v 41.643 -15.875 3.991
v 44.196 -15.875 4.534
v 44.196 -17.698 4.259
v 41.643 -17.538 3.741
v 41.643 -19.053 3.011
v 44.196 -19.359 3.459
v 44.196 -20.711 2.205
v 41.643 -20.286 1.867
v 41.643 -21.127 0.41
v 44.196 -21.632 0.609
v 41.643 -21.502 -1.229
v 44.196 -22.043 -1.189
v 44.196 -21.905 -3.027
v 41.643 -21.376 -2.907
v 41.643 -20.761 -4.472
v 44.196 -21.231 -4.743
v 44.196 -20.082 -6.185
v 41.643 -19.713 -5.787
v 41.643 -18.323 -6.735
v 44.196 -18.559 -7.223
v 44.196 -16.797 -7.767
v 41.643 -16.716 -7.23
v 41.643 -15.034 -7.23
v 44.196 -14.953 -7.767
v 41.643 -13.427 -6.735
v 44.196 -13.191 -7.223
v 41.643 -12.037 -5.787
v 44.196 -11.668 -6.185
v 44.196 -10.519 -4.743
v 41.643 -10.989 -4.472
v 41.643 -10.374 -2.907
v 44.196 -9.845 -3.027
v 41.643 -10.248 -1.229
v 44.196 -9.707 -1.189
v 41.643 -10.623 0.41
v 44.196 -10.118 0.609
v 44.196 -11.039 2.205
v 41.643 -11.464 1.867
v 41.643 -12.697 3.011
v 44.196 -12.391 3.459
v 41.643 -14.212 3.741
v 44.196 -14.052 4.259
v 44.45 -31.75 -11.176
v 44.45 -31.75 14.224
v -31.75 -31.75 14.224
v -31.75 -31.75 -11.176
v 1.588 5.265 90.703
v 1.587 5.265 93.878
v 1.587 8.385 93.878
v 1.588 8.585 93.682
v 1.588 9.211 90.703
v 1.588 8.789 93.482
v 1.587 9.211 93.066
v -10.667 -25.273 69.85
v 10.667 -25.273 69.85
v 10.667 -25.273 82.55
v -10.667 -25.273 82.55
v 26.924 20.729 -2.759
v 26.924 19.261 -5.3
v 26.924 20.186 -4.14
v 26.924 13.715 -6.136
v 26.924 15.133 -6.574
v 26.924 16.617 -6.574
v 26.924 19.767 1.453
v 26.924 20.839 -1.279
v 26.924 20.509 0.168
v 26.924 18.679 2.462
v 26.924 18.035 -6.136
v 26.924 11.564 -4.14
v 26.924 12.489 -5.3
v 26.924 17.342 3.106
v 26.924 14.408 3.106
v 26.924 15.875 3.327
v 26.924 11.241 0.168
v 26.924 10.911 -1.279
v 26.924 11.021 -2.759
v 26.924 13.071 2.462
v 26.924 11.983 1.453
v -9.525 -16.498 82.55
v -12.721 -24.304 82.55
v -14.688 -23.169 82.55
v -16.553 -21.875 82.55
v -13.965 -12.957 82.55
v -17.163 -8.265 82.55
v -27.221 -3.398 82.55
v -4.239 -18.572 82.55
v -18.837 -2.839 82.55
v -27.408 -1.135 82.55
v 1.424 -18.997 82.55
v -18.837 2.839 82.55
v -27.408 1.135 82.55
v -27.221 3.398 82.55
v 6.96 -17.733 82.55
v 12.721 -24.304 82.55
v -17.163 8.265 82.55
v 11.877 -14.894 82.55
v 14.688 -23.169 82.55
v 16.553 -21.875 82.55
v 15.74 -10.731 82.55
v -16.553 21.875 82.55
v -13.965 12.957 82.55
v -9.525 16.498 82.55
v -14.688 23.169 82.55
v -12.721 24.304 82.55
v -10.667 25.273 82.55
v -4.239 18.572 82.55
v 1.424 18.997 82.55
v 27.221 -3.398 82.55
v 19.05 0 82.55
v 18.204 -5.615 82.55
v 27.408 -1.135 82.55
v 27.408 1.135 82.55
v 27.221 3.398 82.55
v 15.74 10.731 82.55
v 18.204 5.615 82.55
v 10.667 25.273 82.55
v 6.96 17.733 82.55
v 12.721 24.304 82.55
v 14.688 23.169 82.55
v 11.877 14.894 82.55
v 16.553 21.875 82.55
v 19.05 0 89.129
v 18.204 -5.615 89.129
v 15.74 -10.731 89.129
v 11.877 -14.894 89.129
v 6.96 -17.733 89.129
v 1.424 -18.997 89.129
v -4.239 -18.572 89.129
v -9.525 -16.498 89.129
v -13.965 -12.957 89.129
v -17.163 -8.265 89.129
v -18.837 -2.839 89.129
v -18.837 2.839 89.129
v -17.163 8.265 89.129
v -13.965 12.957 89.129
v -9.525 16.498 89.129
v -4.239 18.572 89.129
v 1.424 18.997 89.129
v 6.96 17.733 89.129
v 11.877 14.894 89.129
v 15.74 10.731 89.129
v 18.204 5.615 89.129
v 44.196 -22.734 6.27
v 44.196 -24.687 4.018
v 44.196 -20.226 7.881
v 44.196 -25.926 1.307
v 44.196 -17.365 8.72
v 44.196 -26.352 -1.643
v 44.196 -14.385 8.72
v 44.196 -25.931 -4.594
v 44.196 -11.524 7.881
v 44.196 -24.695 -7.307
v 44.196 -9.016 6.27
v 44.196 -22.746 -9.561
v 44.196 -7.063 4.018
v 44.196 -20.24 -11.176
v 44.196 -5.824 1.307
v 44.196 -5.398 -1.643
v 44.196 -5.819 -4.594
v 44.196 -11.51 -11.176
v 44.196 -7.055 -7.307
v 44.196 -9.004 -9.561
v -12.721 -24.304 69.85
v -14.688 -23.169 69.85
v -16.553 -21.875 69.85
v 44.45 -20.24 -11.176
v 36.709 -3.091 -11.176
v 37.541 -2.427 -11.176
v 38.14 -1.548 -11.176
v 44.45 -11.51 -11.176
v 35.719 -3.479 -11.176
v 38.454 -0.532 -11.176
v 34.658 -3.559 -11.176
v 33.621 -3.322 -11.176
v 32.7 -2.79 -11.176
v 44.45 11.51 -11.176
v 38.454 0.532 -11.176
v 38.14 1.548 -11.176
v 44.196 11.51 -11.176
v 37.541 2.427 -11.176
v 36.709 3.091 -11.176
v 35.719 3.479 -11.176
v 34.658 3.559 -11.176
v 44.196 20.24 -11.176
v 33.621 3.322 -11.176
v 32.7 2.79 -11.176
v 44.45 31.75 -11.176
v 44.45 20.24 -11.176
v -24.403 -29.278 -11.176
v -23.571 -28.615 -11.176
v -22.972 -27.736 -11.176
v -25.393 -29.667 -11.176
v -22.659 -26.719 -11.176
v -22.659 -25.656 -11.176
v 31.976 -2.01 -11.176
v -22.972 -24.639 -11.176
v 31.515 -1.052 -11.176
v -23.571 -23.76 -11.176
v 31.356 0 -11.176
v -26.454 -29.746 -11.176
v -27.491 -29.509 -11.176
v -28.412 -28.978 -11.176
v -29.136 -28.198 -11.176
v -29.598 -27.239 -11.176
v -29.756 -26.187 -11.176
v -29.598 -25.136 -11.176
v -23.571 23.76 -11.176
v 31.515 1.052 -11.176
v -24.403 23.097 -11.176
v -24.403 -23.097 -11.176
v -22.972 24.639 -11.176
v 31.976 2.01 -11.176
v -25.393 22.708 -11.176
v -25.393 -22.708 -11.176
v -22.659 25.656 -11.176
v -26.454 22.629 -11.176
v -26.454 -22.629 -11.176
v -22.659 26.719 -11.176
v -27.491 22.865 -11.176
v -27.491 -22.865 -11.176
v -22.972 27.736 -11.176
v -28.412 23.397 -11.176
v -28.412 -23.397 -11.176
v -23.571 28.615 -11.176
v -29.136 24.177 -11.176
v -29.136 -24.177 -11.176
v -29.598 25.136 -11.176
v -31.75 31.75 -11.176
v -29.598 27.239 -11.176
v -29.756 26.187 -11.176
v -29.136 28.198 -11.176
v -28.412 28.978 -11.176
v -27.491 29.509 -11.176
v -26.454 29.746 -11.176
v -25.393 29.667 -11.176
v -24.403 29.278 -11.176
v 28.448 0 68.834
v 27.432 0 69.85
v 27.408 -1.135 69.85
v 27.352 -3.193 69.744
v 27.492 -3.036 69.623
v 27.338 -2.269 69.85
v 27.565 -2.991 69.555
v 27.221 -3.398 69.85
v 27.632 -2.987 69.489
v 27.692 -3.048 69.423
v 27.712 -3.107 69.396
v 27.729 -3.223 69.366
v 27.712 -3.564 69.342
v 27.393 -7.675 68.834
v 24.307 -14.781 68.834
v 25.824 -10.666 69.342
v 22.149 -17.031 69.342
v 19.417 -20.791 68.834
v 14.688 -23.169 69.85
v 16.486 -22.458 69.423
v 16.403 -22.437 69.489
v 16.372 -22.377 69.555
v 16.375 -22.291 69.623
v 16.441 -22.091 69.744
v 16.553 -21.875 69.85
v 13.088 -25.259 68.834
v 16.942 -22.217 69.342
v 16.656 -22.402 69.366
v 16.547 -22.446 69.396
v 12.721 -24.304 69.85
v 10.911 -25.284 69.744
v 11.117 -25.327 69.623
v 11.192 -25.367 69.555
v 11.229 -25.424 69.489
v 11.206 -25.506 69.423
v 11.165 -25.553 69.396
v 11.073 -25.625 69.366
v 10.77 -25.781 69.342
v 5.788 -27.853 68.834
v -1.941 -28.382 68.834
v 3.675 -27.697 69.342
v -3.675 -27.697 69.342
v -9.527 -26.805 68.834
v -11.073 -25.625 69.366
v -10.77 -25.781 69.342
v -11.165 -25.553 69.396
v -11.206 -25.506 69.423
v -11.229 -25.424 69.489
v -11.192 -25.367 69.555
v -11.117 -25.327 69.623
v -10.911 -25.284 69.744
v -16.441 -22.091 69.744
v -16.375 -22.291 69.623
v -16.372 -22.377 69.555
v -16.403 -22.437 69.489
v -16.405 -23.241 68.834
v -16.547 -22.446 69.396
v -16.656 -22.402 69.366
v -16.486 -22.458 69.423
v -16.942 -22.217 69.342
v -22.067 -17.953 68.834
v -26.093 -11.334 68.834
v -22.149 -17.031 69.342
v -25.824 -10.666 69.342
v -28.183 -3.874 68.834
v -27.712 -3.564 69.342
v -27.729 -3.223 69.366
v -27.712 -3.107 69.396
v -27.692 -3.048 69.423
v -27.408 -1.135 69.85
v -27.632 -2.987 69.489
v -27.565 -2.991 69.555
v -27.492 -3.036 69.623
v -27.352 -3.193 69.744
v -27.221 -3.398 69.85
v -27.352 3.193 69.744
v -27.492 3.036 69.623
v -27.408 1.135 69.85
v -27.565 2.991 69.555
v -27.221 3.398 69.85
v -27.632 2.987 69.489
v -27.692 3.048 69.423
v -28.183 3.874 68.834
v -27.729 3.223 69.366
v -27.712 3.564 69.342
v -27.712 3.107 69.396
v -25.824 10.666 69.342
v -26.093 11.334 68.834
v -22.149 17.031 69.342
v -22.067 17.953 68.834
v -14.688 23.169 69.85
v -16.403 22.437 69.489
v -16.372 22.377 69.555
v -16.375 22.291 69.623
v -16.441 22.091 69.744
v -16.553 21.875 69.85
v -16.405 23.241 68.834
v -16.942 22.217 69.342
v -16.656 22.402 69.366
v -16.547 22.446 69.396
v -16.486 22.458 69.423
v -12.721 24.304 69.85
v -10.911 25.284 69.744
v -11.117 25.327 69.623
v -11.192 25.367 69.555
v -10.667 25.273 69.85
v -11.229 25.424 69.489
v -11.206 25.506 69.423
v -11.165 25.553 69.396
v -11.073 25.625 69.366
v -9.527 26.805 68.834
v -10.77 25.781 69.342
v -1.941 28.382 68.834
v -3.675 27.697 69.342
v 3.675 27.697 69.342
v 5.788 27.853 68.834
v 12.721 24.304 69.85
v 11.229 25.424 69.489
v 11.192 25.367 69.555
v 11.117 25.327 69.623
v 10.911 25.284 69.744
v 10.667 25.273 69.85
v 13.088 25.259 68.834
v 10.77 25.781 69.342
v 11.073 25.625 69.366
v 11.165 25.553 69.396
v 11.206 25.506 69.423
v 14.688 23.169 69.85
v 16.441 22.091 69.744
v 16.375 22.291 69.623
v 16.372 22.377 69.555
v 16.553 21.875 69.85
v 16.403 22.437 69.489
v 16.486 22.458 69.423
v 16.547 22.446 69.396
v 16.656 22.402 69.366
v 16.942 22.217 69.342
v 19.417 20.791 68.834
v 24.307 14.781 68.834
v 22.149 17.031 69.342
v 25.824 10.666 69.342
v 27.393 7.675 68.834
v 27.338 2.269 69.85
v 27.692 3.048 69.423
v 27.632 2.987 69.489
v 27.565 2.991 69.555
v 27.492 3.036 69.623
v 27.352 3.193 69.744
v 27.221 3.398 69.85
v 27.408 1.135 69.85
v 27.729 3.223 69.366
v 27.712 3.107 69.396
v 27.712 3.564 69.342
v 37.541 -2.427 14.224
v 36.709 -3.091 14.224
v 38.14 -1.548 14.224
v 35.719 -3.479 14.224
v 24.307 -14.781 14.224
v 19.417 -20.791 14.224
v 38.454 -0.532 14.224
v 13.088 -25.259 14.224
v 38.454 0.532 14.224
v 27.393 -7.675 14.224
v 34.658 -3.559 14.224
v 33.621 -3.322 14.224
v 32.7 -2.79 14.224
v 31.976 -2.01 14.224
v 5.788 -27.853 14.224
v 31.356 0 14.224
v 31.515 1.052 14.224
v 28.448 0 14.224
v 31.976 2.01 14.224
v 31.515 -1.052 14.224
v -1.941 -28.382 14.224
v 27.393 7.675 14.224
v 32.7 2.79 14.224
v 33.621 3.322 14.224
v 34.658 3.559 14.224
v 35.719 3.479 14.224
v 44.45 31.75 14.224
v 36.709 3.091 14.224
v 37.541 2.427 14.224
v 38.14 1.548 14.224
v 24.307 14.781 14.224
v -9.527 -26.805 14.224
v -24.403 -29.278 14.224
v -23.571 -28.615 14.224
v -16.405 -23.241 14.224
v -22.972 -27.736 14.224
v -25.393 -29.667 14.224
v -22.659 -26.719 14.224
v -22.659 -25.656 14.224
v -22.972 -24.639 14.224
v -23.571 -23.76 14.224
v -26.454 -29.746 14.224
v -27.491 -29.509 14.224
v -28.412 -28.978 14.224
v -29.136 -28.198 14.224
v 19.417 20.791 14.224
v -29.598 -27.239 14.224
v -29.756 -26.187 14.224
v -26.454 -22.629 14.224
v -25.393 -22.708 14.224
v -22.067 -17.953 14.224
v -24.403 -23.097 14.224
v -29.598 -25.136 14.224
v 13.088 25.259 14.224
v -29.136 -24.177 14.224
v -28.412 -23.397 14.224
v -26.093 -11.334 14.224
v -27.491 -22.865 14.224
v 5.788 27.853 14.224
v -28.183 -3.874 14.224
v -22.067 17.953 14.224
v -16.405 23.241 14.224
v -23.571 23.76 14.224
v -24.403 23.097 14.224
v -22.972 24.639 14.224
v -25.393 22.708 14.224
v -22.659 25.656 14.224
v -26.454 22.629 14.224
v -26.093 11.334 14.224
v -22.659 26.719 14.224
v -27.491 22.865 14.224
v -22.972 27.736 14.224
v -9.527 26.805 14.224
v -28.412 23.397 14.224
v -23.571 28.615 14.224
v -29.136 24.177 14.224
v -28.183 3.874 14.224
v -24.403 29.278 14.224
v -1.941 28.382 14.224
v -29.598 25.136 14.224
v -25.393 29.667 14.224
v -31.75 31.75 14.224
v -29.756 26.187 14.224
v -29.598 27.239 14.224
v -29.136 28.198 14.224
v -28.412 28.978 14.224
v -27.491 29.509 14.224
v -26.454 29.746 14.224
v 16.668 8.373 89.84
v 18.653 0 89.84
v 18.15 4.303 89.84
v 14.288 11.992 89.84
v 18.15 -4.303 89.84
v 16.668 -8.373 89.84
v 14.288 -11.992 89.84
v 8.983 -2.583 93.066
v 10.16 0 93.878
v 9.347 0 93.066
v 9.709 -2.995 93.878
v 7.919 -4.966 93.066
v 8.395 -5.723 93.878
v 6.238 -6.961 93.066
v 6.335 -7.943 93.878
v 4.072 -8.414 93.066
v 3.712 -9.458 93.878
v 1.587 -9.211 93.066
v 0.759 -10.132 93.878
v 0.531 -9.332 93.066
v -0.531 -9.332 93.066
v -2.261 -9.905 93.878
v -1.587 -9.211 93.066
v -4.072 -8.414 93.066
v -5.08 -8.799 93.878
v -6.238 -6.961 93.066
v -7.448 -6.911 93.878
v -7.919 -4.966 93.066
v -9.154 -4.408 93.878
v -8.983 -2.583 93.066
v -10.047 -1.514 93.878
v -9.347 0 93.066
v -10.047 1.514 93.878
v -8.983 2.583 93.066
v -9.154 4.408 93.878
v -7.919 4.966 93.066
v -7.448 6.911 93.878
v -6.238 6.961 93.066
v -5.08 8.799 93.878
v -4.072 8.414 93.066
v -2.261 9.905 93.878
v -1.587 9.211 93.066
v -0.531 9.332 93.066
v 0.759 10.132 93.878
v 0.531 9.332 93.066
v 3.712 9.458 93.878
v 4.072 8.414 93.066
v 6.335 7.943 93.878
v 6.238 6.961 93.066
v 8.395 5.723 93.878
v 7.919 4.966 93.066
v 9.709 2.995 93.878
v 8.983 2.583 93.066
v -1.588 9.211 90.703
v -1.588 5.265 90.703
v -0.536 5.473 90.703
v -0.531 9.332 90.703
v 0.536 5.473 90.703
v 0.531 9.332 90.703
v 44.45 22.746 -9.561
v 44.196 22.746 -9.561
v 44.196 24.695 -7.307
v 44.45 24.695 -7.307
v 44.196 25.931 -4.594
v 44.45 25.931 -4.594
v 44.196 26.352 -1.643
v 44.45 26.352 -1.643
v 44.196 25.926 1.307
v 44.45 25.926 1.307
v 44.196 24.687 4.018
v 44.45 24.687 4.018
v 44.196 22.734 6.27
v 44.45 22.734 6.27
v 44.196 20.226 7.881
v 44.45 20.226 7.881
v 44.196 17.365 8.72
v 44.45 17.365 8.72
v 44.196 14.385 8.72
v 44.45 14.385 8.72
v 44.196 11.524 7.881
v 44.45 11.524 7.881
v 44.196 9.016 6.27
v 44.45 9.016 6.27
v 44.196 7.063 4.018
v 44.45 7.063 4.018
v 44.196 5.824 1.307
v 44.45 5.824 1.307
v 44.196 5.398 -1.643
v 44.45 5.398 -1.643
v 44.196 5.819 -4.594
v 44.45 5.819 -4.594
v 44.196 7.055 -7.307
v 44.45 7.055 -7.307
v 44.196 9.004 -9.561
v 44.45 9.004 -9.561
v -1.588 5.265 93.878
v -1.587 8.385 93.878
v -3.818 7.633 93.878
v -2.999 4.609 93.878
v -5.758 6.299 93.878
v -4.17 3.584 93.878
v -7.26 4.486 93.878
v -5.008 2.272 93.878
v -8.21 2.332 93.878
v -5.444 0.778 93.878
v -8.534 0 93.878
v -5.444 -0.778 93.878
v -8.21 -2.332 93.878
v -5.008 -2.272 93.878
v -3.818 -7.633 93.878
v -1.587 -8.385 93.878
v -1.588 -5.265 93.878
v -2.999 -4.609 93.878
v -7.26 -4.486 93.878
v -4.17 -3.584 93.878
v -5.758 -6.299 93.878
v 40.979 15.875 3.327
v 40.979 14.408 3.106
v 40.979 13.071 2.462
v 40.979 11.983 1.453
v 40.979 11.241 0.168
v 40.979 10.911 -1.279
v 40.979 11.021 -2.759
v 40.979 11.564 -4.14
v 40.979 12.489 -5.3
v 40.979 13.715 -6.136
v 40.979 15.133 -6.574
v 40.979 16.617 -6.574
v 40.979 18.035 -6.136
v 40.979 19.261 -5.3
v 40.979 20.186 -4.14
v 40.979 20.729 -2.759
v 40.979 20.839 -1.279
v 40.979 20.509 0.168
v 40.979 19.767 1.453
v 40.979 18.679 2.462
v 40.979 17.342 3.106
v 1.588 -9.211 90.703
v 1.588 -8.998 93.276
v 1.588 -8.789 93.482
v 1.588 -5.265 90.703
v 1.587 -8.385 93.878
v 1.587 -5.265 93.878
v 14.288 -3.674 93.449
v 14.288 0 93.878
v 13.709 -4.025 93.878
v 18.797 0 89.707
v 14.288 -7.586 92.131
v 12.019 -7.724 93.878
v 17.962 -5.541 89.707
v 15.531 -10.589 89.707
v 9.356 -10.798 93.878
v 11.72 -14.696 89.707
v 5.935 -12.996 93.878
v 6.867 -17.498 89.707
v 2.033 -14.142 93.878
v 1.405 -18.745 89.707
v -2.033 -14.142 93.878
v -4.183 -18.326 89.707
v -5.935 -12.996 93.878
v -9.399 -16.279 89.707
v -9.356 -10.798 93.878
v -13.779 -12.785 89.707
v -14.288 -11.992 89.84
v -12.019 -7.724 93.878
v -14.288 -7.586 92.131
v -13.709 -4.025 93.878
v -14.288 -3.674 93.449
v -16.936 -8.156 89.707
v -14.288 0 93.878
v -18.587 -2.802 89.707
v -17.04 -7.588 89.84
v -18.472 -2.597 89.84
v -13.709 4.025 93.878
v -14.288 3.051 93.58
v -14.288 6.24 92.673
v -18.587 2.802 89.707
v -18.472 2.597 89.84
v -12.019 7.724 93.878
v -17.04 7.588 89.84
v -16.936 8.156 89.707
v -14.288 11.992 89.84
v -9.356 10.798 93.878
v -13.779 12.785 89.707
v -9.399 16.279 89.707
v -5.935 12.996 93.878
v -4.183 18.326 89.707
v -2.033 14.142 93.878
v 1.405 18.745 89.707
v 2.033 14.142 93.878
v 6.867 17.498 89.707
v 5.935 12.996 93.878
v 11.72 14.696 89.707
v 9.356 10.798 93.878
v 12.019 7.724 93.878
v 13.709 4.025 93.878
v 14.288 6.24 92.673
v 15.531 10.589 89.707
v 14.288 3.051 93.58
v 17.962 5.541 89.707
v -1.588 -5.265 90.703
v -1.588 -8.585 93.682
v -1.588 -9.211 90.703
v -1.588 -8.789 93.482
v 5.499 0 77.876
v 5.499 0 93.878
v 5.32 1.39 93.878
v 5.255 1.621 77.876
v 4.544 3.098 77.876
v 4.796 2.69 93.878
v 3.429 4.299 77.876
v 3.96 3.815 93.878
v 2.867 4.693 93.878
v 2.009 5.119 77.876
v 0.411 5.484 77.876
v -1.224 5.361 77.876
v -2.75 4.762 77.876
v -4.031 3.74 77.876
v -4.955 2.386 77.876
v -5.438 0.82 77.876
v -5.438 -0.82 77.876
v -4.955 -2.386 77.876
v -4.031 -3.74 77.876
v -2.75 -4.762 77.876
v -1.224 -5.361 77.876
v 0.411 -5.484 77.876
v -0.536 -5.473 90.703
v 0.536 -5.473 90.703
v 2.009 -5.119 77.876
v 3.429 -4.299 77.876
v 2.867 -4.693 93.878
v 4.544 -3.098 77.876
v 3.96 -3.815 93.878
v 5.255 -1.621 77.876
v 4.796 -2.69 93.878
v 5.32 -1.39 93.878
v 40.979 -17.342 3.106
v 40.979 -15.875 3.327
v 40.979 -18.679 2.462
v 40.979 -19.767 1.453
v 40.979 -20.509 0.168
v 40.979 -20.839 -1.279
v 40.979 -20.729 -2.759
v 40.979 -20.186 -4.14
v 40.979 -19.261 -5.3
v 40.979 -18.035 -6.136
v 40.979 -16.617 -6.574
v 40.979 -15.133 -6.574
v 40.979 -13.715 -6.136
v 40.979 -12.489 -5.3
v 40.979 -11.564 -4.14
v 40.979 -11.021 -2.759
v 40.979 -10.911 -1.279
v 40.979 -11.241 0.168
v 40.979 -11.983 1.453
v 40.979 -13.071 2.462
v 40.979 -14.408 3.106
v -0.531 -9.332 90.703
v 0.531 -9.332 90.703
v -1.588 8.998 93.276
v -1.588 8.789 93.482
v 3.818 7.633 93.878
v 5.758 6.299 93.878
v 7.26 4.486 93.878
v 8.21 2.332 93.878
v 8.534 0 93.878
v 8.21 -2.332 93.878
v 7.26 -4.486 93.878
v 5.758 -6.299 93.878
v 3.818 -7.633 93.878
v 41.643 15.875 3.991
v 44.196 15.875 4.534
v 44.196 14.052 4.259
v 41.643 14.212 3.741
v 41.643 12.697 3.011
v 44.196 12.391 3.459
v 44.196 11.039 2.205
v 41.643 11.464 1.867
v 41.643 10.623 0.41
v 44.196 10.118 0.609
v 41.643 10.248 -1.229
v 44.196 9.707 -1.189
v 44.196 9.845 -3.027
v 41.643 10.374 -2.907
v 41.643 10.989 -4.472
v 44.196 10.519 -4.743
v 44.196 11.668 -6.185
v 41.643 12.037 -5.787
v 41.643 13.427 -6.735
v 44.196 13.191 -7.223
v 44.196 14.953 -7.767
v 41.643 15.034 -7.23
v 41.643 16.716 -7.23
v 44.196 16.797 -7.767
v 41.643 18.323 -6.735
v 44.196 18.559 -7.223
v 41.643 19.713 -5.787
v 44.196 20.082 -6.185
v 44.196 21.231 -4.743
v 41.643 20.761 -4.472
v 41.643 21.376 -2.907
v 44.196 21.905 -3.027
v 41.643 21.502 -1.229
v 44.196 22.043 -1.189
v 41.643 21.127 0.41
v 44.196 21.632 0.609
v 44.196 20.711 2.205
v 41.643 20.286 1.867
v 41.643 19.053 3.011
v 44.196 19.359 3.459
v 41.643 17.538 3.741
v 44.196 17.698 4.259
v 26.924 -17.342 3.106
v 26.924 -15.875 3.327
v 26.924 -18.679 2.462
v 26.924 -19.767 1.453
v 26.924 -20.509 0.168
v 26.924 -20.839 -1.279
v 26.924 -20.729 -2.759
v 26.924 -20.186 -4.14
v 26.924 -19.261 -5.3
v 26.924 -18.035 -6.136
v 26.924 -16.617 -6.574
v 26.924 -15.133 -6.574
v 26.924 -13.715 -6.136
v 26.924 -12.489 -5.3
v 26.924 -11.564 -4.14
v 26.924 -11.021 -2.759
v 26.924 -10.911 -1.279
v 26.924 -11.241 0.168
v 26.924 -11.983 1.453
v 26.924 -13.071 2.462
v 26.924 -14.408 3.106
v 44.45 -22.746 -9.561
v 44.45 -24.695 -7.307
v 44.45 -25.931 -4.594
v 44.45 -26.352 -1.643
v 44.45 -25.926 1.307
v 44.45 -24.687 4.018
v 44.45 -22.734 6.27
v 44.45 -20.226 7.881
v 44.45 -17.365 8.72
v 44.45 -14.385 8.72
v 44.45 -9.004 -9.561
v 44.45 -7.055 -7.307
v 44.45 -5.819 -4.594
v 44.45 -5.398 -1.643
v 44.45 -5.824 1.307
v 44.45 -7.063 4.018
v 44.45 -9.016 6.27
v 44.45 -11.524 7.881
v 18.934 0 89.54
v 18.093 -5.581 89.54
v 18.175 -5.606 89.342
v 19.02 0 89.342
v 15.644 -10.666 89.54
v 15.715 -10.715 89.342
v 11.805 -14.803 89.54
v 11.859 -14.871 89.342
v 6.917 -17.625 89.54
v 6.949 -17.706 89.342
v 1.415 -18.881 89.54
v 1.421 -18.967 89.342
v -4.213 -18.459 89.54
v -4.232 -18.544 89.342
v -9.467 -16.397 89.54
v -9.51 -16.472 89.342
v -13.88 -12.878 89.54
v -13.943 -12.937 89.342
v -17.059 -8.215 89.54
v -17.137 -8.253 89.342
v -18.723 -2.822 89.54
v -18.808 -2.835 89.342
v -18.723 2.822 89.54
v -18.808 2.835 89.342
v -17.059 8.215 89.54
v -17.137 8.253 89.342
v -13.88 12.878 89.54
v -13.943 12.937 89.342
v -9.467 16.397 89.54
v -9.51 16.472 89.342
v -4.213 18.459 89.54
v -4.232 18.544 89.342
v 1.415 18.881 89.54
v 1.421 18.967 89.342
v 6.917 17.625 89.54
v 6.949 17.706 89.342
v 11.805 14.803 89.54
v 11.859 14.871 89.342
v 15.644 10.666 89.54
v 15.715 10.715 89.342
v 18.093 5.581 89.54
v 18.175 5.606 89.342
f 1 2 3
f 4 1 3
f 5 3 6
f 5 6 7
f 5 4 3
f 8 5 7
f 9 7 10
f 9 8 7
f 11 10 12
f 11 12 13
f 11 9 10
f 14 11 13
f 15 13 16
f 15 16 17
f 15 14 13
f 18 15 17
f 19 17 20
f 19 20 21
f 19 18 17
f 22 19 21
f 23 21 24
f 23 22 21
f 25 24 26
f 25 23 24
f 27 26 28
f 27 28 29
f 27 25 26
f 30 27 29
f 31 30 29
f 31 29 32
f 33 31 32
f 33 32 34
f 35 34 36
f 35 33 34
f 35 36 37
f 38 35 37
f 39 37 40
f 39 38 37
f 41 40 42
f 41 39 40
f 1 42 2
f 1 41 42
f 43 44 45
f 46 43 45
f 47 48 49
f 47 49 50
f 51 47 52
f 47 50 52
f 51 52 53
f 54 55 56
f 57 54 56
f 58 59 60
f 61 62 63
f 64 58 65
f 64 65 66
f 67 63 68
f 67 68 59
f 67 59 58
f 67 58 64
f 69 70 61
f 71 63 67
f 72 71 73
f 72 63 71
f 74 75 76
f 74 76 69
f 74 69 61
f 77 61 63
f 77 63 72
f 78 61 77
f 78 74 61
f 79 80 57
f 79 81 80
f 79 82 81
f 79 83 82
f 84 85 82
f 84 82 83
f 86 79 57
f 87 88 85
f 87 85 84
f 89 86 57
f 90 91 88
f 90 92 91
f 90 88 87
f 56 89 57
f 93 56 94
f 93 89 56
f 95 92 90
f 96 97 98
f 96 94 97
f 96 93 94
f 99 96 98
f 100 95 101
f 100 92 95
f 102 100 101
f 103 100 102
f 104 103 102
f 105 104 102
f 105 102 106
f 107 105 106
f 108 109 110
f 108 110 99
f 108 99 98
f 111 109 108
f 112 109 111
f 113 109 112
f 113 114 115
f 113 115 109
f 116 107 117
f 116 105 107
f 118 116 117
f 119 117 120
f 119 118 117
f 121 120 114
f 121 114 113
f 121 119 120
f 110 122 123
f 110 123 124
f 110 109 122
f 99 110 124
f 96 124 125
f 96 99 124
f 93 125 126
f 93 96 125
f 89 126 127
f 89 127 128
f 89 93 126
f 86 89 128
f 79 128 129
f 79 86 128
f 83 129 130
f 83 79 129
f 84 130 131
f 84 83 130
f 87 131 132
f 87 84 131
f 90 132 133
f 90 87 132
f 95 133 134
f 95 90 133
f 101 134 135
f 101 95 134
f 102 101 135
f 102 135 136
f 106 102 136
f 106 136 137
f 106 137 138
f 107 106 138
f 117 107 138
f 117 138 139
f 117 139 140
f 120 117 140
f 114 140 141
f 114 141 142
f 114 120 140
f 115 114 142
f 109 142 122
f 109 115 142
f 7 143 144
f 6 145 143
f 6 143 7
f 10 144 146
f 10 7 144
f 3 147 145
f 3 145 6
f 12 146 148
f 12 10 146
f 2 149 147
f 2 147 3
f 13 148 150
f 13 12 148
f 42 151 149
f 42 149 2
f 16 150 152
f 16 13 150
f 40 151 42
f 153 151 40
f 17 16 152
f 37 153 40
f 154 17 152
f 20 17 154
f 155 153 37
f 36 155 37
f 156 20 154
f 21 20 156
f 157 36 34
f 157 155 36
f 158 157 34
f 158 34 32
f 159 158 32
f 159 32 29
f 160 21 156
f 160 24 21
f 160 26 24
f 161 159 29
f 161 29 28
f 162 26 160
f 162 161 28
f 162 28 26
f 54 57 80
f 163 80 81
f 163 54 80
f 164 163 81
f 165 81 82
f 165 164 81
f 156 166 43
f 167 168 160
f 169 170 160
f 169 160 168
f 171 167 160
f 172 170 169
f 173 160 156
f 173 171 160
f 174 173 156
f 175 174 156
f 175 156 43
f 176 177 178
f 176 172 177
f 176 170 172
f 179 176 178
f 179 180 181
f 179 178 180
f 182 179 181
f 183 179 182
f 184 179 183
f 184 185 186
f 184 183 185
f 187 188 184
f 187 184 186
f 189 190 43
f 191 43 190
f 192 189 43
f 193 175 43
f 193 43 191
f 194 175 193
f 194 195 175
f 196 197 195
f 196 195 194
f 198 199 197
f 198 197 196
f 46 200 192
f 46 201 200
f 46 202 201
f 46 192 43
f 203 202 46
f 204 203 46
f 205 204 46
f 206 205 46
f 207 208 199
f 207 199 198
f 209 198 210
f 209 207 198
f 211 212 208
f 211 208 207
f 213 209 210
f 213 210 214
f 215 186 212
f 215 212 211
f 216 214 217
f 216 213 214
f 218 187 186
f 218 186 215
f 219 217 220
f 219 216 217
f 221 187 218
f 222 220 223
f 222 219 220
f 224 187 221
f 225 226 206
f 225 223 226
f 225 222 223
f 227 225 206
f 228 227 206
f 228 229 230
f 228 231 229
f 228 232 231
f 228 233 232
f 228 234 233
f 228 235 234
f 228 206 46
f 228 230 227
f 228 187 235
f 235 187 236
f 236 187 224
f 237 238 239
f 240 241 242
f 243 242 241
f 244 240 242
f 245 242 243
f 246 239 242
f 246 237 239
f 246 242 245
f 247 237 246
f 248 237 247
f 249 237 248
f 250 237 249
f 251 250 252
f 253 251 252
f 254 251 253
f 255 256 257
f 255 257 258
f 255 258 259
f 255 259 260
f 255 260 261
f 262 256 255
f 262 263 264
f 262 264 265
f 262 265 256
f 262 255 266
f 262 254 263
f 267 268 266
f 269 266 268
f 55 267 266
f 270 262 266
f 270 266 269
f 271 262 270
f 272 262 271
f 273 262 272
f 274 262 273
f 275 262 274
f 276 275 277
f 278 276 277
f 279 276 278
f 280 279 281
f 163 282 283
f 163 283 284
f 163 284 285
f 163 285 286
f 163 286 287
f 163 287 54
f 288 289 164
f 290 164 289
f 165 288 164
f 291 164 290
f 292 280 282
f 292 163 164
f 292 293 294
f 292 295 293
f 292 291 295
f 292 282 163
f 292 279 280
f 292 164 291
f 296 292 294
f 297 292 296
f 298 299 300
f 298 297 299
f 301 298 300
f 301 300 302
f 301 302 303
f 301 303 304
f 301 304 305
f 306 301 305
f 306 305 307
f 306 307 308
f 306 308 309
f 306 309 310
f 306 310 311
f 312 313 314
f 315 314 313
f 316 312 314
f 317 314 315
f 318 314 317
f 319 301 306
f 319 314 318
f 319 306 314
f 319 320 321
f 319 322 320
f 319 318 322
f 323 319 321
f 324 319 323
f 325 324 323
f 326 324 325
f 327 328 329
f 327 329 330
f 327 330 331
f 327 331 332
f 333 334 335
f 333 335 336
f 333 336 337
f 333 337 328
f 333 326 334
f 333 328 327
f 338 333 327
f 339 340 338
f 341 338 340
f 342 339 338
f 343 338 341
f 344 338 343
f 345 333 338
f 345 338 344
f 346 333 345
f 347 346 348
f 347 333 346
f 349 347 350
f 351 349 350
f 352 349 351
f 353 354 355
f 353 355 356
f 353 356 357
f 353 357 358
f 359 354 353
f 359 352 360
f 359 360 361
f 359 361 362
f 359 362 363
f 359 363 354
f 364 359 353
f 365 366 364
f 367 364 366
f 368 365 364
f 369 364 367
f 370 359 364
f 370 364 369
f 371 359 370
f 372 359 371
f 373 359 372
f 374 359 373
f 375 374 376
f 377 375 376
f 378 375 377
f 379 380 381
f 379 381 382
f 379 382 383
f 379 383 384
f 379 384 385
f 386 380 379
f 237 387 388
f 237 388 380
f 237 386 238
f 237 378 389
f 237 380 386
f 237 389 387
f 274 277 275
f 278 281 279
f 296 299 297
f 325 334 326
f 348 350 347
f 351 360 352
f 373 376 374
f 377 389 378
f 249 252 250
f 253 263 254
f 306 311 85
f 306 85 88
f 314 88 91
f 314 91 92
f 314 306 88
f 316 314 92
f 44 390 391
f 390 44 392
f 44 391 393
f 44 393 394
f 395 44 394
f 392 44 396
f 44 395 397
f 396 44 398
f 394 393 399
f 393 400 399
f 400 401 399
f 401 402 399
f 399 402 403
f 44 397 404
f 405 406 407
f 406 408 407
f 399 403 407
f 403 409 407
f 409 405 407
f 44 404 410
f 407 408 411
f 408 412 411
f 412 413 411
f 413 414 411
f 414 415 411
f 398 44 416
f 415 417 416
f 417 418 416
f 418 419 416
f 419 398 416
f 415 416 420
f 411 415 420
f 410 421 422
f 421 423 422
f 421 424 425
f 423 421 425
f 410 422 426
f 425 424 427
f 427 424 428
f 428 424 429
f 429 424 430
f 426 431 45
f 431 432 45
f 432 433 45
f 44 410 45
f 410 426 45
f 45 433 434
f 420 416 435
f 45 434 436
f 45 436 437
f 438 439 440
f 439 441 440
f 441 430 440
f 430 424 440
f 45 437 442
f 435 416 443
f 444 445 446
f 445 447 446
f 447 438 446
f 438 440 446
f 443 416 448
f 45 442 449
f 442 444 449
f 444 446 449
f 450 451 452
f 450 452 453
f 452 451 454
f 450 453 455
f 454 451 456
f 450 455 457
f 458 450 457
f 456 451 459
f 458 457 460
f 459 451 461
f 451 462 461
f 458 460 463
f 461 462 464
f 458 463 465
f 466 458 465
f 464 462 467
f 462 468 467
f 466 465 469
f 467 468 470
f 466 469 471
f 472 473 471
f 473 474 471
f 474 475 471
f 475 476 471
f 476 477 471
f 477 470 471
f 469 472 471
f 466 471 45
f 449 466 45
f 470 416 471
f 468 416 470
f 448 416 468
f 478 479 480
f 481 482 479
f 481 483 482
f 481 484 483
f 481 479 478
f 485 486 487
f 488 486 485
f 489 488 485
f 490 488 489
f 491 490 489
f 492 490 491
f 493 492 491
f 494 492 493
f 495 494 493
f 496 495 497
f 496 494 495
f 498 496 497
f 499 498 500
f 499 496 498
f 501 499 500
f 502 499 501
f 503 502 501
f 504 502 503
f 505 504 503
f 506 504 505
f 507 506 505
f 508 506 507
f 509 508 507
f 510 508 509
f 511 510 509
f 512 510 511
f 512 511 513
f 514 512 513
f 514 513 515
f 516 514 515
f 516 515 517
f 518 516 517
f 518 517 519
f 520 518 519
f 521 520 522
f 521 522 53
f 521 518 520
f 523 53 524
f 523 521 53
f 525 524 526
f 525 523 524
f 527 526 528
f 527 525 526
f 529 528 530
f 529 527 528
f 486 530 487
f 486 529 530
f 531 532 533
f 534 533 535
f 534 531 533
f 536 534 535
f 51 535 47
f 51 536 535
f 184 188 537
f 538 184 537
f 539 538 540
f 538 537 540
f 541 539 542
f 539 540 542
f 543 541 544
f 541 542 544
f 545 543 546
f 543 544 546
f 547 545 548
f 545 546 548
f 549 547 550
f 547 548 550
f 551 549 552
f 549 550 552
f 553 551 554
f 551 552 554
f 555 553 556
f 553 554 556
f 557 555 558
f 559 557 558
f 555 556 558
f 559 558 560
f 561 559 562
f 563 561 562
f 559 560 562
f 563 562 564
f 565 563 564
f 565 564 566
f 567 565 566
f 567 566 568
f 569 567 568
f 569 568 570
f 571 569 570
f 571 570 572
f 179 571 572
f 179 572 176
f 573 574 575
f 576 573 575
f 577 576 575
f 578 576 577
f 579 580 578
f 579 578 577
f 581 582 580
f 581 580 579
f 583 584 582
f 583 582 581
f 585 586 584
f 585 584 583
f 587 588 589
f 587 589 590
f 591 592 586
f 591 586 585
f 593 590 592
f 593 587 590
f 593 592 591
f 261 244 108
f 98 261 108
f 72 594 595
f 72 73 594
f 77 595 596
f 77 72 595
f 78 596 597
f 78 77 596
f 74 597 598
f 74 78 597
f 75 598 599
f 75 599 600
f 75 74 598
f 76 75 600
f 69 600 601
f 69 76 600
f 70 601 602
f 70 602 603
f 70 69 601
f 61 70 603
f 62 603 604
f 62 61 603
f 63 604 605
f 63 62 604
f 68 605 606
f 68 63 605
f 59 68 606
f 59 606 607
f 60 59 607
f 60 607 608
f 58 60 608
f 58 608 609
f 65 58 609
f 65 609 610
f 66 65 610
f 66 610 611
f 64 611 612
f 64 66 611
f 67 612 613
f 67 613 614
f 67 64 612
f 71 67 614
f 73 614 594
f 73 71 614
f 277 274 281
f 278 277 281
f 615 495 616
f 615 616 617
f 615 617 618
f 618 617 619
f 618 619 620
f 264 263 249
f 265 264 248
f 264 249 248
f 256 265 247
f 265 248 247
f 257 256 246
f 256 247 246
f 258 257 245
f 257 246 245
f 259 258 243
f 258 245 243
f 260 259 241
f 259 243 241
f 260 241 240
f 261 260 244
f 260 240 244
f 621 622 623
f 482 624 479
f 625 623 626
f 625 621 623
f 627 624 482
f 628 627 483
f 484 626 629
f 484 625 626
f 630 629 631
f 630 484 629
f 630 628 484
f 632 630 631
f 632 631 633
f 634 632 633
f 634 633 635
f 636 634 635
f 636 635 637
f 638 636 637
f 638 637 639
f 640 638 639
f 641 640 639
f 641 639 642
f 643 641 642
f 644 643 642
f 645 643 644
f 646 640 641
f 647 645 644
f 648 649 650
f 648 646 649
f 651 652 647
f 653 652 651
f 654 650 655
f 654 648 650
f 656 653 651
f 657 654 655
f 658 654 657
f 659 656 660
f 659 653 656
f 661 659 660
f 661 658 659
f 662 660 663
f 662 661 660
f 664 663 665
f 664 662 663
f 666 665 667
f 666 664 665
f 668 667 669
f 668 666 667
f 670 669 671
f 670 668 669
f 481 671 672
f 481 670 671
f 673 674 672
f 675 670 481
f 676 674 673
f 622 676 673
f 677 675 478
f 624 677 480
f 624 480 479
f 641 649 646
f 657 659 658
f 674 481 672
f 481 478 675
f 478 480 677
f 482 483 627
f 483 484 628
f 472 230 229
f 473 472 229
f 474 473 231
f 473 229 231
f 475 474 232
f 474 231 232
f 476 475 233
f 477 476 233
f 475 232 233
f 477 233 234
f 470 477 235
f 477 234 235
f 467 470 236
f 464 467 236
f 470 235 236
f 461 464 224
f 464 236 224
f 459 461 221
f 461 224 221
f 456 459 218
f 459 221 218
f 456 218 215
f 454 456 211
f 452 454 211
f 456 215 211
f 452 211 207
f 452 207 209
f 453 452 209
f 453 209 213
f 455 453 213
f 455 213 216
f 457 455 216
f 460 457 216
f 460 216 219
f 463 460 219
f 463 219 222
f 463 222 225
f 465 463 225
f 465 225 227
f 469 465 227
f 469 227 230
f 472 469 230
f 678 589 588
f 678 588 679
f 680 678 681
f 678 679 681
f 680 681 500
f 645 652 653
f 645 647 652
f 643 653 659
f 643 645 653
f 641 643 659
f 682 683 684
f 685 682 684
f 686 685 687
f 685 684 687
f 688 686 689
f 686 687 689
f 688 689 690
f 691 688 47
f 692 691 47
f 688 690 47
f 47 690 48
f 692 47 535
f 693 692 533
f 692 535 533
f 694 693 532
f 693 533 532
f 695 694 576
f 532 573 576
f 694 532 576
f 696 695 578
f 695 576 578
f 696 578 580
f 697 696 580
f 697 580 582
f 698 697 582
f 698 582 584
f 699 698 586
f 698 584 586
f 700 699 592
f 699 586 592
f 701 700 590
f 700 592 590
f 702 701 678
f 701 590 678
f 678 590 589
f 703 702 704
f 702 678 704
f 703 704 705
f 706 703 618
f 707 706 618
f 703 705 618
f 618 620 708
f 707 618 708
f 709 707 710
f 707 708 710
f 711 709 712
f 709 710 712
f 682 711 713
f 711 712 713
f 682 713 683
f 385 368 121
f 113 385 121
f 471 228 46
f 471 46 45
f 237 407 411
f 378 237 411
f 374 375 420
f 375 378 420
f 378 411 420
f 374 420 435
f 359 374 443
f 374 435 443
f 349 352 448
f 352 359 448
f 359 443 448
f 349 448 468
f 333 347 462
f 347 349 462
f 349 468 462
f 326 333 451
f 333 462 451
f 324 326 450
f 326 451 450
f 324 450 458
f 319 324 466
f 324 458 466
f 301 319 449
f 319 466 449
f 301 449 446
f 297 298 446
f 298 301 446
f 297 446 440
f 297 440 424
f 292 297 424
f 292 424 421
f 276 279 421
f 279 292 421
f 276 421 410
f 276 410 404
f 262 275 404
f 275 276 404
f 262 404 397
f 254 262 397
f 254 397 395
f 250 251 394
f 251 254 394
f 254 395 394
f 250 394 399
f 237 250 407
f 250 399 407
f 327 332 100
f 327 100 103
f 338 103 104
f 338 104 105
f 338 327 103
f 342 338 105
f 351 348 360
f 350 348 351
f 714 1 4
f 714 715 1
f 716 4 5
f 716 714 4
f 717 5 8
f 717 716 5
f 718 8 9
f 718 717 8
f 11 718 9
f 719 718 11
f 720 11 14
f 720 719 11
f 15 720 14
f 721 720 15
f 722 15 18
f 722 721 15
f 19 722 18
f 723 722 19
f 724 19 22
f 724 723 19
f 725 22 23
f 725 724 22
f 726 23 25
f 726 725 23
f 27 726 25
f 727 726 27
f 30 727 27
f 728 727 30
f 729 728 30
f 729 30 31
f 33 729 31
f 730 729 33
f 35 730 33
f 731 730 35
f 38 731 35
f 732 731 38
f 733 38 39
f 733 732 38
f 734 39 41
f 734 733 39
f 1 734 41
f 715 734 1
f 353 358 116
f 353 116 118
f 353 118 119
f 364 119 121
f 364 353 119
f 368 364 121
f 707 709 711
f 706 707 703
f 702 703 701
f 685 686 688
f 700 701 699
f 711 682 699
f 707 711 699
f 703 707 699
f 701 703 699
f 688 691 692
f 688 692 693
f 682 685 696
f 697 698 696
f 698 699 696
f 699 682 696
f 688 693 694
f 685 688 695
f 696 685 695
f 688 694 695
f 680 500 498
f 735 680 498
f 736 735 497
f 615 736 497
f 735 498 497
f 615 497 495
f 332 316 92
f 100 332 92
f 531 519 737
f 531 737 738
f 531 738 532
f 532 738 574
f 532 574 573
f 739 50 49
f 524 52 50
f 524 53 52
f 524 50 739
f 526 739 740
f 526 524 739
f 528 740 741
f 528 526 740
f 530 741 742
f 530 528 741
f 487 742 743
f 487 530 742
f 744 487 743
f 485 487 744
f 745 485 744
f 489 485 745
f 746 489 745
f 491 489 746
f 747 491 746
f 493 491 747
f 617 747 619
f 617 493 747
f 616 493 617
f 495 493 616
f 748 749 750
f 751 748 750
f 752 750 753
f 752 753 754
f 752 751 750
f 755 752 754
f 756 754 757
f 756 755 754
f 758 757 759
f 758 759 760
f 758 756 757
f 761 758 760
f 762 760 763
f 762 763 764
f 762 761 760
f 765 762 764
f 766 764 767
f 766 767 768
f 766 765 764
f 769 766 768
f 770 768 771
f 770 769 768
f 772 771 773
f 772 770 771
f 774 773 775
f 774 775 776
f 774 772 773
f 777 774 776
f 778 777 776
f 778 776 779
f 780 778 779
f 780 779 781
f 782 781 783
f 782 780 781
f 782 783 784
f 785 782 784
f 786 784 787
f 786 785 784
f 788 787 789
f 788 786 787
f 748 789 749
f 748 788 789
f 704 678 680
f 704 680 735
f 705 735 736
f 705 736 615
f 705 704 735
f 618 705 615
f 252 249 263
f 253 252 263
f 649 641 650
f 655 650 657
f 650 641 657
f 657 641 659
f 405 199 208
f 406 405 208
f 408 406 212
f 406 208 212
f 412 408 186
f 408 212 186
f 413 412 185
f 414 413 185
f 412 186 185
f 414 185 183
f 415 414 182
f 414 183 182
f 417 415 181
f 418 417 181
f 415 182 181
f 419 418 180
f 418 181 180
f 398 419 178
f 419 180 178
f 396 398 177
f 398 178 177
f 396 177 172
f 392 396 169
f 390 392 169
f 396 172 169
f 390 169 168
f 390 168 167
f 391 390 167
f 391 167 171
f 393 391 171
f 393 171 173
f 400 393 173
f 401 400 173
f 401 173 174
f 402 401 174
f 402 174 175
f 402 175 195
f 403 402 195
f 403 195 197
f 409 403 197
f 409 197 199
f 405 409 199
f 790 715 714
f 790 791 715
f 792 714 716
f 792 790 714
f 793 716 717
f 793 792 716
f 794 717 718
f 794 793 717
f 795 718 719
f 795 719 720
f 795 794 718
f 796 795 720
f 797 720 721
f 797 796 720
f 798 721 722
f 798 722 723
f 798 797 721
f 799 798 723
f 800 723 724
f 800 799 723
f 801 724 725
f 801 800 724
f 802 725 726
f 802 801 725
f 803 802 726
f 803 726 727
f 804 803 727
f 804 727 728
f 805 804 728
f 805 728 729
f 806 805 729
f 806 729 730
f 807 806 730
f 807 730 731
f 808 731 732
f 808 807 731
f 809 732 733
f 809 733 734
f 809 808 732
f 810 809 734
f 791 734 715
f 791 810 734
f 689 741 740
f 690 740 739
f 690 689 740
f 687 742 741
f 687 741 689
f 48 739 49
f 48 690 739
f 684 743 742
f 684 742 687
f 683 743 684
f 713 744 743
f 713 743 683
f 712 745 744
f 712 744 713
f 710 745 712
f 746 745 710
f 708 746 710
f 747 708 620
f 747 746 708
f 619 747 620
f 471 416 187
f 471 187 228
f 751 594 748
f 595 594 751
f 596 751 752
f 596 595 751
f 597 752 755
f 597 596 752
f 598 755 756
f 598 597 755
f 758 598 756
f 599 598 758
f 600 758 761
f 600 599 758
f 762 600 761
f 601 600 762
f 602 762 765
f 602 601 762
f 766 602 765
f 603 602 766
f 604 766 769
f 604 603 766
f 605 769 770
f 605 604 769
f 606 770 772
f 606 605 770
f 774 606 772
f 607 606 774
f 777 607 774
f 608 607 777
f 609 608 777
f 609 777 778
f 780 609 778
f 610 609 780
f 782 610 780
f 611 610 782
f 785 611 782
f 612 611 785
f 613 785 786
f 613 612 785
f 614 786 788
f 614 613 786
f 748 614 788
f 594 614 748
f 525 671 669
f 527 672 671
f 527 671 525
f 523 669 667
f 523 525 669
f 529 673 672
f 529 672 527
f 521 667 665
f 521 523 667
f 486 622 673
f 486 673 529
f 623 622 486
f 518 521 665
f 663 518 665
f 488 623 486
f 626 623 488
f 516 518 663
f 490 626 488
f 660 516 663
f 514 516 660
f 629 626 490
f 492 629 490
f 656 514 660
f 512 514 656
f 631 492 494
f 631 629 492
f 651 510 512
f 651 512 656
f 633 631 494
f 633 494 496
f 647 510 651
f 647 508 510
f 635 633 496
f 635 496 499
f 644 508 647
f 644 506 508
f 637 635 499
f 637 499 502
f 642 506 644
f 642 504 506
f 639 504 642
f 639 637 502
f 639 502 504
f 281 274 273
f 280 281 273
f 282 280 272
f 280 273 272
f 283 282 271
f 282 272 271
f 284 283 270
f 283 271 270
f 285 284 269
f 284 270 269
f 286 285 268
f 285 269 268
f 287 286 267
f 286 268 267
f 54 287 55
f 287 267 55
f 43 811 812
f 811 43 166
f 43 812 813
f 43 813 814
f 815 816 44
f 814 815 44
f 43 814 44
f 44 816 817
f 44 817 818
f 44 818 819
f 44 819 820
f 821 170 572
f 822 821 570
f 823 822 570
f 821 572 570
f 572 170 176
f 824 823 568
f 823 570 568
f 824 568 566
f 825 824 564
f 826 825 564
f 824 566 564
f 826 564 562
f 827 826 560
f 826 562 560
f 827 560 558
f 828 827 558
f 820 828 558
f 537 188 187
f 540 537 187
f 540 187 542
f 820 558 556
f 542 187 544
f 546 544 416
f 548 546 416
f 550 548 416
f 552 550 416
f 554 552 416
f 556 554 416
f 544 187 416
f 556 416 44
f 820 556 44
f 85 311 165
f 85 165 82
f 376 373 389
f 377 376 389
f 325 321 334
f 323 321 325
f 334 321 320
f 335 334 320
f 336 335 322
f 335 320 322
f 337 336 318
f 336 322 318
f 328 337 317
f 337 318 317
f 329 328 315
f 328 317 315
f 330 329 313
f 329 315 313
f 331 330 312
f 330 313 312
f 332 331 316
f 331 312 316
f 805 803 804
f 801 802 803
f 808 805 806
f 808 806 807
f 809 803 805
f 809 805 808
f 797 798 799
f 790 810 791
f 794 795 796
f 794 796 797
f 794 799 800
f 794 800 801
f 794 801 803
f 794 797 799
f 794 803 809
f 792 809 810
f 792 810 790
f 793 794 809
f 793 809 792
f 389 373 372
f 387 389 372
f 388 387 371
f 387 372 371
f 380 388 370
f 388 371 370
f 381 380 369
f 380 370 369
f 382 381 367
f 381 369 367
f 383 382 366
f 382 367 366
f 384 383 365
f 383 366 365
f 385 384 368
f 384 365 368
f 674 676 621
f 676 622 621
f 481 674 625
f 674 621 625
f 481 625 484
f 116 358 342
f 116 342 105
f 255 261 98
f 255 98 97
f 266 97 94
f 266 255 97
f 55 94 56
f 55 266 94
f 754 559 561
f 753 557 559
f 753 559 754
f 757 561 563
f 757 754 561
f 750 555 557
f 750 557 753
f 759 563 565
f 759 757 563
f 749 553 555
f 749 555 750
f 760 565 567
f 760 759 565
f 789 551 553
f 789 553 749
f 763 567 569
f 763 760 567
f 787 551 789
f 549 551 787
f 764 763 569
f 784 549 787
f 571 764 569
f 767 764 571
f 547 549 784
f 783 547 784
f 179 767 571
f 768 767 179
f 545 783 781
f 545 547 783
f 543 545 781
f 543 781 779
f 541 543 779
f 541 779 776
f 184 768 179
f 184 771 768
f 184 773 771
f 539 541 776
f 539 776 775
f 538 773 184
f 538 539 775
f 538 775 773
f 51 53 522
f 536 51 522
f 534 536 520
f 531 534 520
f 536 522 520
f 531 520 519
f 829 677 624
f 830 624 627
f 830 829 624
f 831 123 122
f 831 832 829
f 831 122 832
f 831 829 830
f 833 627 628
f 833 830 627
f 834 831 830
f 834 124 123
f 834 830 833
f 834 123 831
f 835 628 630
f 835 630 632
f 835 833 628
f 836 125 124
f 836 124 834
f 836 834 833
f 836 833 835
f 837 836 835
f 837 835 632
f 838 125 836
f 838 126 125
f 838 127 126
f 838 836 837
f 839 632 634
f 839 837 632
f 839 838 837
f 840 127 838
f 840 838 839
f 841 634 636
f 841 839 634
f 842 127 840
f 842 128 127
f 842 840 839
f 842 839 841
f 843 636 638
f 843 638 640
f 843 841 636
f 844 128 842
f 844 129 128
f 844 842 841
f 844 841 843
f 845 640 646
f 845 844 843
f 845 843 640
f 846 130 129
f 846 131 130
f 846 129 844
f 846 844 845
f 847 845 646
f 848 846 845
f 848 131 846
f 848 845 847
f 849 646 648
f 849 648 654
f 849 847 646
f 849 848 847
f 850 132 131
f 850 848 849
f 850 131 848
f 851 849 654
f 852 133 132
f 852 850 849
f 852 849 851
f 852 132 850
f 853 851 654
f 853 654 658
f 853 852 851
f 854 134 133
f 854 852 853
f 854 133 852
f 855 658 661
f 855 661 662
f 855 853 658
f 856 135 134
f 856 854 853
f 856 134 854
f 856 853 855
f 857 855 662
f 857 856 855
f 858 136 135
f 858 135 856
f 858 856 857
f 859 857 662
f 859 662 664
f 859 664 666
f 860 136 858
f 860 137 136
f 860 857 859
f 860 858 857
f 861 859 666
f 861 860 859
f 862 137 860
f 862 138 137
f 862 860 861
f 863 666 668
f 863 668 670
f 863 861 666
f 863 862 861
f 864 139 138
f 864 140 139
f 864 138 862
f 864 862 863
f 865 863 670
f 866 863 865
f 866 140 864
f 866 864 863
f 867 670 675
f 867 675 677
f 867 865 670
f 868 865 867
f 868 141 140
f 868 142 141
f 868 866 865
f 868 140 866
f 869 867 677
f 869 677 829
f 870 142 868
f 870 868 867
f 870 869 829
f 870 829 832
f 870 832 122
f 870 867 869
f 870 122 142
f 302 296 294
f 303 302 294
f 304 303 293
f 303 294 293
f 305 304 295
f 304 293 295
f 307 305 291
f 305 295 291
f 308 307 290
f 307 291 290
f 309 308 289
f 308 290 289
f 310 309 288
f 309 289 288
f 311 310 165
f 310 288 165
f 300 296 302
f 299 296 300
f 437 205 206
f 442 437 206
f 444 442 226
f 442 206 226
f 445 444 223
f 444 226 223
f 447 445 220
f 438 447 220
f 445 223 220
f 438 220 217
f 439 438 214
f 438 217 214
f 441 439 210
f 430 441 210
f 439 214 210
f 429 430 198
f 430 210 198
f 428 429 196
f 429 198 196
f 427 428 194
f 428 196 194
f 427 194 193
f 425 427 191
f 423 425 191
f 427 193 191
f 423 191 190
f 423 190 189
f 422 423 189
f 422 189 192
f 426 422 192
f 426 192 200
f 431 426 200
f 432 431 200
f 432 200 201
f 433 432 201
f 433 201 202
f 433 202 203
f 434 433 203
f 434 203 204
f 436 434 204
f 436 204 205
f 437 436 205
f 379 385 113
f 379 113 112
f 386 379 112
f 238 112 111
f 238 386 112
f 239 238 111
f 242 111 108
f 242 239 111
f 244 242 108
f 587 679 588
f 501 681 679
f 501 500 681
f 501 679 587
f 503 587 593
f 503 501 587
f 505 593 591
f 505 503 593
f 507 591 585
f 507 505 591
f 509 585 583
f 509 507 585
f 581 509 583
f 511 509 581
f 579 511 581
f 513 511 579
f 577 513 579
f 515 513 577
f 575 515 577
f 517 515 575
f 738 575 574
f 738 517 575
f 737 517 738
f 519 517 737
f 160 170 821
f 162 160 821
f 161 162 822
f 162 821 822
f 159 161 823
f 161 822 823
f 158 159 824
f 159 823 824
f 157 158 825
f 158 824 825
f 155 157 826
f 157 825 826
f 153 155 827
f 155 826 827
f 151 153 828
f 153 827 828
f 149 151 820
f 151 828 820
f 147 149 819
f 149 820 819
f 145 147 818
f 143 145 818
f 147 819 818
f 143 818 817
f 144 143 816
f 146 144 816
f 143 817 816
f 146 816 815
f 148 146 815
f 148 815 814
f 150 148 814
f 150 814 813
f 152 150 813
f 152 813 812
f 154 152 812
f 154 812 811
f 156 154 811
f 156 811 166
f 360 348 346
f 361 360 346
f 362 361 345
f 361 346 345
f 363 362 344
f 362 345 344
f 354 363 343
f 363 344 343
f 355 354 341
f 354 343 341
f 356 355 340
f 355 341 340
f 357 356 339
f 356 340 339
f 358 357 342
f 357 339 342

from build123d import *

# Parameters (mm, degrees)
SKETCH1_R           = 28.448
EXTRUDE1_DEPTH      = 82.55
CUT_EXTRUDE1_DEPTH  = 34.1376
SKETCH13_W          = 11.3284
SKETCH13_H          = 19.05
S2D0011_W           = 5.4991
S2D0011_H           = 16.002
SKETCH16_W          = 76.2
SKETCH16_H          = 25.4
EXTRUDE2_DEPTH      = 31.75
EXTRUDE2_DEPTH_BACK = 31.75
SKETCH17_R          = 10.4775
CUT_EXTRUDE9_DEPTH  = 0.254
SKETCH18_R          = 10.4775
CUT_EXTRUDE10_DEPTH = 0.254
CIRPATTERN2_COUNT   = 6
HOLE1_D             = 7.1374
HOLE1_DEPTH         = 25.4
CUT_EXTRUDE11_DEPTH = 4.0386
CUT_EXTRUDE12_DEPTH = 3.175


with BuildPart() as part:
    # Sketch1 → Extrude1 (new body)
    with BuildSketch(Plane.XY):
        Circle(SKETCH1_R)
    extrude(amount=EXTRUDE1_DEPTH)

    # Sketch2 → Cut-Extrude1 (cut, symmetric)
    with BuildSketch(Plane(origin=(0, 0, 0), x_dir=(0, 0, 1), z_dir=(1, 0, 0))):
        with BuildLine():
            Line((69.342, 28.448), (69.342, 25.781))
            ThreePointArc((69.342, 25.781), (69.490789755, 25.421789755), (69.85, 25.273))
            Line((69.85, 25.273), (82.55, 25.273))
            Line((82.55, 25.273), (82.55, 28.448))
            Line((82.55, 28.448), (69.342, 28.448))
        make_face()
    cut_extrude1 = extrude(amount=CUT_EXTRUDE1_DEPTH, both=True, mode=Mode.SUBTRACT)

    # Sketch10 → Cut-Revolve1 (revolve, cut)
    with BuildSketch(Plane(origin=(0, 0, 0), x_dir=(0, 0, -1), z_dir=(1, 0, 0)), mode=Mode.PRIVATE) as cut_revolve1_sk:
        Polygon((-82.55, 27.432), (-69.85, 27.432), (-68.834, 28.448), (-82.55, 28.448), align=None)
    revolve(cut_revolve1_sk.sketch.rotate(Axis((0, 0, 83.2358), (0, 0, -1)), 90), axis=Axis((0, 0, 83.2358), (0, 0, -1)), mode=Mode.SUBTRACT)  # turned: the seam where the file's is

    # Sketch13 → Revolve1 (revolve)
    with BuildSketch(Plane(origin=(0, 0, 0), x_dir=(0, 0, -1), z_dir=(1, 0, 0)), mode=Mode.PRIVATE) as revolve1_sk:
        with Locations((-88.2142, 9.525)):
            Rectangle(SKETCH13_W, SKETCH13_H)
    revolve(revolve1_sk.sketch.rotate(Axis((0, 0, 94.44482), (0, 0, -1)), 90), axis=Axis((0, 0, 94.44482), (0, 0, -1)))  # turned: the seam where the file's is

    # S2D0011 → Cut-Revolve4 (revolve, cut)
    with BuildSketch(Plane(origin=(-5.4991, 0, 93.8784), x_dir=(-1, 0, 0), z_dir=(0, 1, 0)), mode=Mode.PRIVATE) as cut_revolve4_sk:
        with Locations((-2.74955, -8.001)):
            Rectangle(S2D0011_W, S2D0011_H)
    revolve(cut_revolve4_sk.sketch.rotate(Axis((0, 0, 39.576937479), (0, 0, 1)), 180), axis=Axis((0, 0, 39.576937479), (0, 0, 1)), mode=Mode.SUBTRACT)  # turned: the seam where the file's is

    # Sketch15 → Cut-Revolve5 (revolve, cut)
    with BuildSketch(Plane(origin=(0, 0, 0), x_dir=(0, 0, -1), z_dir=(1, 0, 0)), mode=Mode.PRIVATE) as cut_revolve5_sk:
        with BuildLine():
            Line((-93.8784, 14.2875), (-89.706615474, 18.79729325))
            ThreePointArc((-89.706615474, 18.79729325), (-89.444021381, 18.984062482), (-89.1286, 19.05))
            Line((-89.1286, 19.05), (-93.8784, 19.05))
            Line((-93.8784, 19.05), (-93.8784, 14.2875))
        make_face()
    revolve(cut_revolve5_sk.sketch.rotate(Axis((0, 0, 94.11589), (0, 0, -1)), 90), axis=Axis((0, 0, 94.11589), (0, 0, -1)), mode=Mode.SUBTRACT)  # turned: the seam where the file's is

    # Sketch16 → Extrude2 (add, two sides)
    with BuildSketch(Plane(origin=(0, 0, 0), x_dir=(-1, 0, 0), z_dir=(0, 1, 0))) as extrude2_sk:
        with Locations((-6.35, 1.524)):
            Rectangle(SKETCH16_W, SKETCH16_H)
    extrude(amount=EXTRUDE2_DEPTH)
    extrude(extrude2_sk.sketch, amount=-EXTRUDE2_DEPTH_BACK)

    # Sketch17 → Cut-Extrude9 (cut)
    with BuildSketch(Plane(origin=(44.45, 0, 0), x_dir=(0, 0, -1), z_dir=(1, 0, 0))):
        with Locations((1.651, -15.875)):
            Circle(SKETCH17_R)
    extrude(amount=-CUT_EXTRUDE9_DEPTH, mode=Mode.SUBTRACT)

    # Sketch18 → Cut-Extrude10 (cut)
    with BuildSketch(Plane(origin=(44.45, 0, 0), x_dir=(0, 0, -1), z_dir=(1, 0, 0))):
        with Locations((1.651, 15.875)):
            Circle(SKETCH18_R)
    extrude(amount=-CUT_EXTRUDE10_DEPTH, mode=Mode.SUBTRACT)

    # S2D0002 → Cut-Revolve6 (revolve, cut)
    with BuildSketch(Plane(origin=(44.196, -15.875, -1.651), x_dir=(0, -1, 0), z_dir=(0, 0, 1)), mode=Mode.PRIVATE) as cut_revolve6_sk:
        Polygon((0, 0), (6.1849, 0), (5.642306865, -2.5527), (4.9784, -3.216606865), (4.9784, -17.272), (0, -17.272), align=None)
    revolve(cut_revolve6_sk.sketch.rotate(Axis((26.0604, -15.875, -1.651), (1, 0, 0)), 270), axis=Axis((26.0604, -15.875, -1.651), (1, 0, 0)), mode=Mode.SUBTRACT)  # turned: the seam where the file's is

    # S2D0001 → Cut-Revolve7 (revolve, cut)
    with BuildSketch(Plane(origin=(44.196, 15.875, -1.651), x_dir=(0, -1, 0), z_dir=(0, 0, 1)), mode=Mode.PRIVATE) as cut_revolve7_sk:
        Polygon((0, 0), (6.1849, 0), (5.642306865, -2.5527), (4.9784, -3.216606865), (4.9784, -17.272), (0, -17.272), align=None)
    revolve(cut_revolve7_sk.sketch.rotate(Axis((26.0604, 15.875, -1.651), (1, 0, 0)), 270), axis=Axis((26.0604, 15.875, -1.651), (1, 0, 0)), mode=Mode.SUBTRACT)  # turned: the seam where the file's is

    # CirPattern2: Cut-Extrude1 ×6 about axis
    cirpattern2_axis = Axis((0, 0, 0), (0, 0, 1))
    for i in range(1, CIRPATTERN2_COUNT):
        add(cut_extrude1.rotate(cirpattern2_axis, i * 360 / CIRPATTERN2_COUNT), mode=Mode.SUBTRACT)

    # Hole1
    with Locations(Plane.XY.offset(14.224)):
        with Locations((-26.1874, -26.1874), (34.925, 0), (-26.1874, 26.1874)):
            Hole(HOLE1_D / 2, depth=HOLE1_DEPTH)

    # Sketch23 → Cut-Extrude11 (cut)
    with BuildSketch(Plane.XY.offset(93.8784)):
        with BuildLine():
            Line((-14.2875, 12.600390619), (-14.2875, -12.600390619))
            ThreePointArc((-14.2875, -12.600390619), (-19.05, 0), (-14.2875, 12.600390619))
        make_face()
        with BuildLine():
            Line((14.2875, 12.600390619), (14.2875, -12.600390619))
            ThreePointArc((14.2875, -12.600390619), (19.05, 0), (14.2875, 12.600390619))
        make_face()
    extrude(amount=-CUT_EXTRUDE11_DEPTH, mode=Mode.SUBTRACT)

    # Sketch25 → Cut-Revolve8 (revolve, cut)
    with BuildSketch(Plane(origin=(0, 0, 0), x_dir=(0, 0, -1), z_dir=(1, 0, 0)), mode=Mode.PRIVATE) as cut_revolve8_sk:
        Polygon((-93.8784, 8.5344), (-93.0656, 9.3472), (-93.8784, 10.16), align=None)
    revolve(cut_revolve8_sk.sketch.rotate(Axis((0, 0, 93.13164), (0, 0, -1)), 90), axis=Axis((0, 0, 93.13164), (0, 0, -1)), mode=Mode.SUBTRACT)  # turned: the seam where the file's is

    # Sketch26 → Cut-Extrude12 (cut)
    with BuildSketch(Plane.XY.offset(93.8784)):
        with BuildLine():
            Line((-1.5875, 9.211405517), (-1.5875, -9.211405517))
            ThreePointArc((-1.5875, -9.211405517), (0, -9.3472), (1.5875, -9.211405517))
            Line((1.5875, -9.211405517), (1.5875, 9.211405517))
            ThreePointArc((1.5875, 9.211405517), (0, 9.3472), (-1.5875, 9.211405517))
        make_face()
    extrude(amount=-CUT_EXTRUDE12_DEPTH, mode=Mode.SUBTRACT)


solid = part.part
